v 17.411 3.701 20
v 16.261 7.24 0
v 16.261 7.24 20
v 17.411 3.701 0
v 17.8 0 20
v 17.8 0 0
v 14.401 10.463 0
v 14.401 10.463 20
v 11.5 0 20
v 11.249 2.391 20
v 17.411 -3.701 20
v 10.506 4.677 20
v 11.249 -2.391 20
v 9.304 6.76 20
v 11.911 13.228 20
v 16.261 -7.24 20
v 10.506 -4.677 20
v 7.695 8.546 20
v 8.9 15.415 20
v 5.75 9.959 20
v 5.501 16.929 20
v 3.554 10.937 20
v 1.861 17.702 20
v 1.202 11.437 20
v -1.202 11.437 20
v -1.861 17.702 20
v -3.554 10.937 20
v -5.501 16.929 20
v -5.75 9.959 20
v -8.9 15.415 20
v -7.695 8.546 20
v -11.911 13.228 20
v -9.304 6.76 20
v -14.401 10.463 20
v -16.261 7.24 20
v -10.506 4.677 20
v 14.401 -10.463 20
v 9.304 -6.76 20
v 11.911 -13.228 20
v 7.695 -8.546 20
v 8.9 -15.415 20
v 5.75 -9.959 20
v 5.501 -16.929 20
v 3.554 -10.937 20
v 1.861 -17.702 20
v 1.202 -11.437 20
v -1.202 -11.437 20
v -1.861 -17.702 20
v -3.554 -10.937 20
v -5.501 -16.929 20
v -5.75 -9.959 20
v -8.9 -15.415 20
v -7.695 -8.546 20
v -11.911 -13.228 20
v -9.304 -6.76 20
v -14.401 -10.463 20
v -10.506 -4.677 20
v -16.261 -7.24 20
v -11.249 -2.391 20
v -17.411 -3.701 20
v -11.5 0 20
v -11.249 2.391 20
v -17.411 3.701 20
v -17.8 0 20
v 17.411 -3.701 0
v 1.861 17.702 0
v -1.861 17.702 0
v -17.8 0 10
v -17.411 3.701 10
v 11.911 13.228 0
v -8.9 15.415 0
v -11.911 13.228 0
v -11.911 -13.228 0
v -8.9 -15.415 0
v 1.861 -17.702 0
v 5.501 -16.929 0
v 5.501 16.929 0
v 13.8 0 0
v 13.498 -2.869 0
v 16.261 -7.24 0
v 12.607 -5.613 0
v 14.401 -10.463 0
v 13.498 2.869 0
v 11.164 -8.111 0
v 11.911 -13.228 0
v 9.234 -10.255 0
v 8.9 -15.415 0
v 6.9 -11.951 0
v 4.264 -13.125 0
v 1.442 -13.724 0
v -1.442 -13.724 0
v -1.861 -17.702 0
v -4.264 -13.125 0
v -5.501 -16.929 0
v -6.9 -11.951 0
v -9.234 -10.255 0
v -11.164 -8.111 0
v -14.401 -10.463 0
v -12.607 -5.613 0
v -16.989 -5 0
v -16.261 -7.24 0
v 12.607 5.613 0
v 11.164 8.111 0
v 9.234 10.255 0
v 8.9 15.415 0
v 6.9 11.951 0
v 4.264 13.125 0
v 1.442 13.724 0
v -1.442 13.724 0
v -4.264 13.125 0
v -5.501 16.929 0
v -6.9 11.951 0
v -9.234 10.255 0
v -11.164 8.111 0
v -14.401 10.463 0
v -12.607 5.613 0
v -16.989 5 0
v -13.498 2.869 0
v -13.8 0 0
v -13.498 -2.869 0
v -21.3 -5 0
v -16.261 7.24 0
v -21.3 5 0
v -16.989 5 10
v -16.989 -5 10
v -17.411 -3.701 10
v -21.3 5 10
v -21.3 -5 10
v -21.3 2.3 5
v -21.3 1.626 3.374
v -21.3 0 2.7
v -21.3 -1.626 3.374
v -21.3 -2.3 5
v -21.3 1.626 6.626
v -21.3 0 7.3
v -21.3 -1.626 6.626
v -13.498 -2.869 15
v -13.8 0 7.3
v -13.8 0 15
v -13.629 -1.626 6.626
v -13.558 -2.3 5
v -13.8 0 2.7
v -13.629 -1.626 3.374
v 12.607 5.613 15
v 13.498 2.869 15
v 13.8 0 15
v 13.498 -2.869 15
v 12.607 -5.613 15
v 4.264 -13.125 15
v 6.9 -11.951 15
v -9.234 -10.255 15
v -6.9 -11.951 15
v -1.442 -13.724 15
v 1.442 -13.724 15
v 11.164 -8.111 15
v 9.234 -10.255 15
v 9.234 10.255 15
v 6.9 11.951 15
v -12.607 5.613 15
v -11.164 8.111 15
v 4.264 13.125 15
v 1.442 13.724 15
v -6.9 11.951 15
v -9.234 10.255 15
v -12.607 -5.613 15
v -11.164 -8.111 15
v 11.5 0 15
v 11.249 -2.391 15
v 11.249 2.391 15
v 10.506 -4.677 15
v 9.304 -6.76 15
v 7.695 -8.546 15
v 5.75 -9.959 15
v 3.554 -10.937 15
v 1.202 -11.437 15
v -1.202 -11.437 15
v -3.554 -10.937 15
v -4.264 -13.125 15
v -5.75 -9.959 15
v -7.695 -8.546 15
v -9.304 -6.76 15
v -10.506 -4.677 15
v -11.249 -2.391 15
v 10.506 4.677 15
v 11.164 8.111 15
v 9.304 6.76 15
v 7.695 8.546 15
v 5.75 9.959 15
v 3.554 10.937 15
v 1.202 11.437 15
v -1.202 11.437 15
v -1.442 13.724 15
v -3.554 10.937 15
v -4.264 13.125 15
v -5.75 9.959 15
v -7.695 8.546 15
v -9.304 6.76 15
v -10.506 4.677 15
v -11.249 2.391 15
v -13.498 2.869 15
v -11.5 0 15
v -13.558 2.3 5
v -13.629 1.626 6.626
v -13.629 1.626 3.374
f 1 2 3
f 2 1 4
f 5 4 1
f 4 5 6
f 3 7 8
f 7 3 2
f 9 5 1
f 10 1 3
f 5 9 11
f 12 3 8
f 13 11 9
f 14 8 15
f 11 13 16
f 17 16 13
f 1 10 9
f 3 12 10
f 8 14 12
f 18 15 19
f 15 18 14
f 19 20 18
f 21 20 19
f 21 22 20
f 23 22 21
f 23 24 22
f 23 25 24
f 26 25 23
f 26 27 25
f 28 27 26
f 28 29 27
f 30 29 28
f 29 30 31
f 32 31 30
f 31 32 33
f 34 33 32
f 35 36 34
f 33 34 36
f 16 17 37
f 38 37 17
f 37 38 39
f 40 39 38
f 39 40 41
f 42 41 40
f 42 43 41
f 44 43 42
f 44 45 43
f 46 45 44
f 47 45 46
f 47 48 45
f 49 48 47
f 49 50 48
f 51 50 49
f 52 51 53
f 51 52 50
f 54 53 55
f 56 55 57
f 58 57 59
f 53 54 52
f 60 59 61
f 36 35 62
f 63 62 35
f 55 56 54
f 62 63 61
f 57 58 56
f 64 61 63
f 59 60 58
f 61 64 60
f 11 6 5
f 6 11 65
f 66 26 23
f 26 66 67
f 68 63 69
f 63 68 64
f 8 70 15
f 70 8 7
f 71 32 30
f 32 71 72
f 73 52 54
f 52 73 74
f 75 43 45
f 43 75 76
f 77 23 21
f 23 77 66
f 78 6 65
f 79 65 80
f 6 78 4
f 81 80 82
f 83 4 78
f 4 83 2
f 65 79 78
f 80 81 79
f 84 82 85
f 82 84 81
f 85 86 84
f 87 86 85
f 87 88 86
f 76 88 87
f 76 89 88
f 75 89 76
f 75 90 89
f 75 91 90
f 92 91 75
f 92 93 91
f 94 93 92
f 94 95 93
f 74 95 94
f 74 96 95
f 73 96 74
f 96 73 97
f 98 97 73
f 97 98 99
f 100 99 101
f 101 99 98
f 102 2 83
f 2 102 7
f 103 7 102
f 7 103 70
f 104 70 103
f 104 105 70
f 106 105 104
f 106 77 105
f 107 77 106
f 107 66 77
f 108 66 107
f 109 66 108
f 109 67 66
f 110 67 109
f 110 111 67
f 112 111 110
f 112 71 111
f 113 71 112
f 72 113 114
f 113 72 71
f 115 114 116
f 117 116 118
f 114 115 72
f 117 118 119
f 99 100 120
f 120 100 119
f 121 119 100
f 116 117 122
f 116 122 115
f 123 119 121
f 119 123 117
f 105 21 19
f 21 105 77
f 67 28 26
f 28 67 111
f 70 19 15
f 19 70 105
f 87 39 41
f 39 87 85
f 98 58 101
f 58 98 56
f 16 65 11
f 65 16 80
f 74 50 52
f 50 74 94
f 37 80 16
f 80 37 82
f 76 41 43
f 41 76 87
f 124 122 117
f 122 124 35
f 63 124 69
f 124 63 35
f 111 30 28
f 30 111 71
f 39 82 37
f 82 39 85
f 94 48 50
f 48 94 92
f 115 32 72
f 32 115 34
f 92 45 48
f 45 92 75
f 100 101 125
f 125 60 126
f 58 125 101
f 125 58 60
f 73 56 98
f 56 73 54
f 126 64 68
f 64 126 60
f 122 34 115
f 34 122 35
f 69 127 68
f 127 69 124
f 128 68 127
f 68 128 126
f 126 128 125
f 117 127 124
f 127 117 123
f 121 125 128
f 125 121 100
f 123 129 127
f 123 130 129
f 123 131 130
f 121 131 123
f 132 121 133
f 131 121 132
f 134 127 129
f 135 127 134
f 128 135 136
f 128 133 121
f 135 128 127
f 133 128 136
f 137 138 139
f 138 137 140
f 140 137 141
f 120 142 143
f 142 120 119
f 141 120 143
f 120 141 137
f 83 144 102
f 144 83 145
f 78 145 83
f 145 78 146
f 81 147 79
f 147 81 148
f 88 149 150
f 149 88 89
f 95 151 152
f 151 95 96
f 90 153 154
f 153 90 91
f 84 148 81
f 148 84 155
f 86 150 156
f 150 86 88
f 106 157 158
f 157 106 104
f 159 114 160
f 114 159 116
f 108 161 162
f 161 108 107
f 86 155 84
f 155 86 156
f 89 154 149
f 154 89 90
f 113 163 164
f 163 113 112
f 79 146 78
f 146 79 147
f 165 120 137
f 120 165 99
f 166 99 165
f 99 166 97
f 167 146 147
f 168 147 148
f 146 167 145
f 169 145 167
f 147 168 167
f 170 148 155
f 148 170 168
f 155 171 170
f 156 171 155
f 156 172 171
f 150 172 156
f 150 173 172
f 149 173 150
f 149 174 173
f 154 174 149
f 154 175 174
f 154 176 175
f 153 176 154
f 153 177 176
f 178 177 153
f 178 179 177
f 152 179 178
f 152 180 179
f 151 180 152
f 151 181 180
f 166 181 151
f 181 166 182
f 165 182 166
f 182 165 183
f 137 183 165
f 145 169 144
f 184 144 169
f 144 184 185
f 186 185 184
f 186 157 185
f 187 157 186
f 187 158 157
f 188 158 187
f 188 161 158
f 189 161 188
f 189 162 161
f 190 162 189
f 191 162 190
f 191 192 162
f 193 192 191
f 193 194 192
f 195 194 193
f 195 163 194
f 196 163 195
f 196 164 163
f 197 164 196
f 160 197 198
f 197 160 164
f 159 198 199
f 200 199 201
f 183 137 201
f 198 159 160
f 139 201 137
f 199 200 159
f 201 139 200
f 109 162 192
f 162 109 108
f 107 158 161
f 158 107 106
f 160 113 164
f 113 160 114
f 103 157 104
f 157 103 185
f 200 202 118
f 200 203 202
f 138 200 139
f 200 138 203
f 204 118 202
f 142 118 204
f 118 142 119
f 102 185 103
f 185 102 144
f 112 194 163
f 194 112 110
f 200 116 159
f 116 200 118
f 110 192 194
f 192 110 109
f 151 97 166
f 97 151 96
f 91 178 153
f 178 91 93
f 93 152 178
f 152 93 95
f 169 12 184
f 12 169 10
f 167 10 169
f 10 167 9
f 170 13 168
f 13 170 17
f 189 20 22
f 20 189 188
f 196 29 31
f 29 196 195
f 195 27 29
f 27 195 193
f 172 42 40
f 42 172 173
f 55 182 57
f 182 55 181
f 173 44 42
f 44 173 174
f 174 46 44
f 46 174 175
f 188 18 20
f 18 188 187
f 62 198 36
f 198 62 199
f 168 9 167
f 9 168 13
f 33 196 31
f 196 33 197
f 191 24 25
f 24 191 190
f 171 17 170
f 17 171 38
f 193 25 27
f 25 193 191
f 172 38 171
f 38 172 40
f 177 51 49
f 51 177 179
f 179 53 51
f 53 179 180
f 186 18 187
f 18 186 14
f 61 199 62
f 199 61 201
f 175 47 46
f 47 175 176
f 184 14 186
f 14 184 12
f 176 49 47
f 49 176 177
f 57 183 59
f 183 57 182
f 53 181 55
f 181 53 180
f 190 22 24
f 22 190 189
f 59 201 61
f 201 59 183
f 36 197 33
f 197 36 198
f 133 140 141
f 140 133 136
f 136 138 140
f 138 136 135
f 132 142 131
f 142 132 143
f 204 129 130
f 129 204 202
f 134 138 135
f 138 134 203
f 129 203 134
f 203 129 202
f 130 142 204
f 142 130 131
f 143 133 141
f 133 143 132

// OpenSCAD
pipedia = 13.8;
attachoff = 3.5;
screwsize = 2.3;
pvc3_4 = 10.5;
pvc3_4off = pvc3_4 + 1;

endcap();

module endcap(){
  rotate([0,0,0]){
    outerdiameter = (pipedia+4);
    supportradius = pipedia+2;//1.9;
    screwzoff = pipedia+2.5;
    difference(){
      union(){
      cylinder(h = 20, r1 = outerdiameter, r2 = outerdiameter);
        translate([-1.5,-supportradius,0]){
        //cube([17,(2*supportradius),4]);//cube([17,30.8,4]);//, center=true);
        };
        translate([-1.5,-supportradius,16]){
        //cube([17,(2*supportradius),4]);//30.8,4]);//, center=true);
        };
        rotate([0,0,90]){
        translate([0,screwzoff,5]){
        cube([10,10,10], center=true);
        };
      };
  };
  rotate([0,0,0]){
     translate([0,0,-5]){
      cylinder(h = 20, r1 = pipedia, r2 = pipedia);
     };
     cylinder(h = 20, r1 = pvc3_4off, r2 = pvc3_4off);
     translate([0,0,5]){
     rotate([0,-90,0]){
     cylinder(h=25, r1 =screwsize, r2= screwsize);
     };
   };
 };
    };
  };
}
